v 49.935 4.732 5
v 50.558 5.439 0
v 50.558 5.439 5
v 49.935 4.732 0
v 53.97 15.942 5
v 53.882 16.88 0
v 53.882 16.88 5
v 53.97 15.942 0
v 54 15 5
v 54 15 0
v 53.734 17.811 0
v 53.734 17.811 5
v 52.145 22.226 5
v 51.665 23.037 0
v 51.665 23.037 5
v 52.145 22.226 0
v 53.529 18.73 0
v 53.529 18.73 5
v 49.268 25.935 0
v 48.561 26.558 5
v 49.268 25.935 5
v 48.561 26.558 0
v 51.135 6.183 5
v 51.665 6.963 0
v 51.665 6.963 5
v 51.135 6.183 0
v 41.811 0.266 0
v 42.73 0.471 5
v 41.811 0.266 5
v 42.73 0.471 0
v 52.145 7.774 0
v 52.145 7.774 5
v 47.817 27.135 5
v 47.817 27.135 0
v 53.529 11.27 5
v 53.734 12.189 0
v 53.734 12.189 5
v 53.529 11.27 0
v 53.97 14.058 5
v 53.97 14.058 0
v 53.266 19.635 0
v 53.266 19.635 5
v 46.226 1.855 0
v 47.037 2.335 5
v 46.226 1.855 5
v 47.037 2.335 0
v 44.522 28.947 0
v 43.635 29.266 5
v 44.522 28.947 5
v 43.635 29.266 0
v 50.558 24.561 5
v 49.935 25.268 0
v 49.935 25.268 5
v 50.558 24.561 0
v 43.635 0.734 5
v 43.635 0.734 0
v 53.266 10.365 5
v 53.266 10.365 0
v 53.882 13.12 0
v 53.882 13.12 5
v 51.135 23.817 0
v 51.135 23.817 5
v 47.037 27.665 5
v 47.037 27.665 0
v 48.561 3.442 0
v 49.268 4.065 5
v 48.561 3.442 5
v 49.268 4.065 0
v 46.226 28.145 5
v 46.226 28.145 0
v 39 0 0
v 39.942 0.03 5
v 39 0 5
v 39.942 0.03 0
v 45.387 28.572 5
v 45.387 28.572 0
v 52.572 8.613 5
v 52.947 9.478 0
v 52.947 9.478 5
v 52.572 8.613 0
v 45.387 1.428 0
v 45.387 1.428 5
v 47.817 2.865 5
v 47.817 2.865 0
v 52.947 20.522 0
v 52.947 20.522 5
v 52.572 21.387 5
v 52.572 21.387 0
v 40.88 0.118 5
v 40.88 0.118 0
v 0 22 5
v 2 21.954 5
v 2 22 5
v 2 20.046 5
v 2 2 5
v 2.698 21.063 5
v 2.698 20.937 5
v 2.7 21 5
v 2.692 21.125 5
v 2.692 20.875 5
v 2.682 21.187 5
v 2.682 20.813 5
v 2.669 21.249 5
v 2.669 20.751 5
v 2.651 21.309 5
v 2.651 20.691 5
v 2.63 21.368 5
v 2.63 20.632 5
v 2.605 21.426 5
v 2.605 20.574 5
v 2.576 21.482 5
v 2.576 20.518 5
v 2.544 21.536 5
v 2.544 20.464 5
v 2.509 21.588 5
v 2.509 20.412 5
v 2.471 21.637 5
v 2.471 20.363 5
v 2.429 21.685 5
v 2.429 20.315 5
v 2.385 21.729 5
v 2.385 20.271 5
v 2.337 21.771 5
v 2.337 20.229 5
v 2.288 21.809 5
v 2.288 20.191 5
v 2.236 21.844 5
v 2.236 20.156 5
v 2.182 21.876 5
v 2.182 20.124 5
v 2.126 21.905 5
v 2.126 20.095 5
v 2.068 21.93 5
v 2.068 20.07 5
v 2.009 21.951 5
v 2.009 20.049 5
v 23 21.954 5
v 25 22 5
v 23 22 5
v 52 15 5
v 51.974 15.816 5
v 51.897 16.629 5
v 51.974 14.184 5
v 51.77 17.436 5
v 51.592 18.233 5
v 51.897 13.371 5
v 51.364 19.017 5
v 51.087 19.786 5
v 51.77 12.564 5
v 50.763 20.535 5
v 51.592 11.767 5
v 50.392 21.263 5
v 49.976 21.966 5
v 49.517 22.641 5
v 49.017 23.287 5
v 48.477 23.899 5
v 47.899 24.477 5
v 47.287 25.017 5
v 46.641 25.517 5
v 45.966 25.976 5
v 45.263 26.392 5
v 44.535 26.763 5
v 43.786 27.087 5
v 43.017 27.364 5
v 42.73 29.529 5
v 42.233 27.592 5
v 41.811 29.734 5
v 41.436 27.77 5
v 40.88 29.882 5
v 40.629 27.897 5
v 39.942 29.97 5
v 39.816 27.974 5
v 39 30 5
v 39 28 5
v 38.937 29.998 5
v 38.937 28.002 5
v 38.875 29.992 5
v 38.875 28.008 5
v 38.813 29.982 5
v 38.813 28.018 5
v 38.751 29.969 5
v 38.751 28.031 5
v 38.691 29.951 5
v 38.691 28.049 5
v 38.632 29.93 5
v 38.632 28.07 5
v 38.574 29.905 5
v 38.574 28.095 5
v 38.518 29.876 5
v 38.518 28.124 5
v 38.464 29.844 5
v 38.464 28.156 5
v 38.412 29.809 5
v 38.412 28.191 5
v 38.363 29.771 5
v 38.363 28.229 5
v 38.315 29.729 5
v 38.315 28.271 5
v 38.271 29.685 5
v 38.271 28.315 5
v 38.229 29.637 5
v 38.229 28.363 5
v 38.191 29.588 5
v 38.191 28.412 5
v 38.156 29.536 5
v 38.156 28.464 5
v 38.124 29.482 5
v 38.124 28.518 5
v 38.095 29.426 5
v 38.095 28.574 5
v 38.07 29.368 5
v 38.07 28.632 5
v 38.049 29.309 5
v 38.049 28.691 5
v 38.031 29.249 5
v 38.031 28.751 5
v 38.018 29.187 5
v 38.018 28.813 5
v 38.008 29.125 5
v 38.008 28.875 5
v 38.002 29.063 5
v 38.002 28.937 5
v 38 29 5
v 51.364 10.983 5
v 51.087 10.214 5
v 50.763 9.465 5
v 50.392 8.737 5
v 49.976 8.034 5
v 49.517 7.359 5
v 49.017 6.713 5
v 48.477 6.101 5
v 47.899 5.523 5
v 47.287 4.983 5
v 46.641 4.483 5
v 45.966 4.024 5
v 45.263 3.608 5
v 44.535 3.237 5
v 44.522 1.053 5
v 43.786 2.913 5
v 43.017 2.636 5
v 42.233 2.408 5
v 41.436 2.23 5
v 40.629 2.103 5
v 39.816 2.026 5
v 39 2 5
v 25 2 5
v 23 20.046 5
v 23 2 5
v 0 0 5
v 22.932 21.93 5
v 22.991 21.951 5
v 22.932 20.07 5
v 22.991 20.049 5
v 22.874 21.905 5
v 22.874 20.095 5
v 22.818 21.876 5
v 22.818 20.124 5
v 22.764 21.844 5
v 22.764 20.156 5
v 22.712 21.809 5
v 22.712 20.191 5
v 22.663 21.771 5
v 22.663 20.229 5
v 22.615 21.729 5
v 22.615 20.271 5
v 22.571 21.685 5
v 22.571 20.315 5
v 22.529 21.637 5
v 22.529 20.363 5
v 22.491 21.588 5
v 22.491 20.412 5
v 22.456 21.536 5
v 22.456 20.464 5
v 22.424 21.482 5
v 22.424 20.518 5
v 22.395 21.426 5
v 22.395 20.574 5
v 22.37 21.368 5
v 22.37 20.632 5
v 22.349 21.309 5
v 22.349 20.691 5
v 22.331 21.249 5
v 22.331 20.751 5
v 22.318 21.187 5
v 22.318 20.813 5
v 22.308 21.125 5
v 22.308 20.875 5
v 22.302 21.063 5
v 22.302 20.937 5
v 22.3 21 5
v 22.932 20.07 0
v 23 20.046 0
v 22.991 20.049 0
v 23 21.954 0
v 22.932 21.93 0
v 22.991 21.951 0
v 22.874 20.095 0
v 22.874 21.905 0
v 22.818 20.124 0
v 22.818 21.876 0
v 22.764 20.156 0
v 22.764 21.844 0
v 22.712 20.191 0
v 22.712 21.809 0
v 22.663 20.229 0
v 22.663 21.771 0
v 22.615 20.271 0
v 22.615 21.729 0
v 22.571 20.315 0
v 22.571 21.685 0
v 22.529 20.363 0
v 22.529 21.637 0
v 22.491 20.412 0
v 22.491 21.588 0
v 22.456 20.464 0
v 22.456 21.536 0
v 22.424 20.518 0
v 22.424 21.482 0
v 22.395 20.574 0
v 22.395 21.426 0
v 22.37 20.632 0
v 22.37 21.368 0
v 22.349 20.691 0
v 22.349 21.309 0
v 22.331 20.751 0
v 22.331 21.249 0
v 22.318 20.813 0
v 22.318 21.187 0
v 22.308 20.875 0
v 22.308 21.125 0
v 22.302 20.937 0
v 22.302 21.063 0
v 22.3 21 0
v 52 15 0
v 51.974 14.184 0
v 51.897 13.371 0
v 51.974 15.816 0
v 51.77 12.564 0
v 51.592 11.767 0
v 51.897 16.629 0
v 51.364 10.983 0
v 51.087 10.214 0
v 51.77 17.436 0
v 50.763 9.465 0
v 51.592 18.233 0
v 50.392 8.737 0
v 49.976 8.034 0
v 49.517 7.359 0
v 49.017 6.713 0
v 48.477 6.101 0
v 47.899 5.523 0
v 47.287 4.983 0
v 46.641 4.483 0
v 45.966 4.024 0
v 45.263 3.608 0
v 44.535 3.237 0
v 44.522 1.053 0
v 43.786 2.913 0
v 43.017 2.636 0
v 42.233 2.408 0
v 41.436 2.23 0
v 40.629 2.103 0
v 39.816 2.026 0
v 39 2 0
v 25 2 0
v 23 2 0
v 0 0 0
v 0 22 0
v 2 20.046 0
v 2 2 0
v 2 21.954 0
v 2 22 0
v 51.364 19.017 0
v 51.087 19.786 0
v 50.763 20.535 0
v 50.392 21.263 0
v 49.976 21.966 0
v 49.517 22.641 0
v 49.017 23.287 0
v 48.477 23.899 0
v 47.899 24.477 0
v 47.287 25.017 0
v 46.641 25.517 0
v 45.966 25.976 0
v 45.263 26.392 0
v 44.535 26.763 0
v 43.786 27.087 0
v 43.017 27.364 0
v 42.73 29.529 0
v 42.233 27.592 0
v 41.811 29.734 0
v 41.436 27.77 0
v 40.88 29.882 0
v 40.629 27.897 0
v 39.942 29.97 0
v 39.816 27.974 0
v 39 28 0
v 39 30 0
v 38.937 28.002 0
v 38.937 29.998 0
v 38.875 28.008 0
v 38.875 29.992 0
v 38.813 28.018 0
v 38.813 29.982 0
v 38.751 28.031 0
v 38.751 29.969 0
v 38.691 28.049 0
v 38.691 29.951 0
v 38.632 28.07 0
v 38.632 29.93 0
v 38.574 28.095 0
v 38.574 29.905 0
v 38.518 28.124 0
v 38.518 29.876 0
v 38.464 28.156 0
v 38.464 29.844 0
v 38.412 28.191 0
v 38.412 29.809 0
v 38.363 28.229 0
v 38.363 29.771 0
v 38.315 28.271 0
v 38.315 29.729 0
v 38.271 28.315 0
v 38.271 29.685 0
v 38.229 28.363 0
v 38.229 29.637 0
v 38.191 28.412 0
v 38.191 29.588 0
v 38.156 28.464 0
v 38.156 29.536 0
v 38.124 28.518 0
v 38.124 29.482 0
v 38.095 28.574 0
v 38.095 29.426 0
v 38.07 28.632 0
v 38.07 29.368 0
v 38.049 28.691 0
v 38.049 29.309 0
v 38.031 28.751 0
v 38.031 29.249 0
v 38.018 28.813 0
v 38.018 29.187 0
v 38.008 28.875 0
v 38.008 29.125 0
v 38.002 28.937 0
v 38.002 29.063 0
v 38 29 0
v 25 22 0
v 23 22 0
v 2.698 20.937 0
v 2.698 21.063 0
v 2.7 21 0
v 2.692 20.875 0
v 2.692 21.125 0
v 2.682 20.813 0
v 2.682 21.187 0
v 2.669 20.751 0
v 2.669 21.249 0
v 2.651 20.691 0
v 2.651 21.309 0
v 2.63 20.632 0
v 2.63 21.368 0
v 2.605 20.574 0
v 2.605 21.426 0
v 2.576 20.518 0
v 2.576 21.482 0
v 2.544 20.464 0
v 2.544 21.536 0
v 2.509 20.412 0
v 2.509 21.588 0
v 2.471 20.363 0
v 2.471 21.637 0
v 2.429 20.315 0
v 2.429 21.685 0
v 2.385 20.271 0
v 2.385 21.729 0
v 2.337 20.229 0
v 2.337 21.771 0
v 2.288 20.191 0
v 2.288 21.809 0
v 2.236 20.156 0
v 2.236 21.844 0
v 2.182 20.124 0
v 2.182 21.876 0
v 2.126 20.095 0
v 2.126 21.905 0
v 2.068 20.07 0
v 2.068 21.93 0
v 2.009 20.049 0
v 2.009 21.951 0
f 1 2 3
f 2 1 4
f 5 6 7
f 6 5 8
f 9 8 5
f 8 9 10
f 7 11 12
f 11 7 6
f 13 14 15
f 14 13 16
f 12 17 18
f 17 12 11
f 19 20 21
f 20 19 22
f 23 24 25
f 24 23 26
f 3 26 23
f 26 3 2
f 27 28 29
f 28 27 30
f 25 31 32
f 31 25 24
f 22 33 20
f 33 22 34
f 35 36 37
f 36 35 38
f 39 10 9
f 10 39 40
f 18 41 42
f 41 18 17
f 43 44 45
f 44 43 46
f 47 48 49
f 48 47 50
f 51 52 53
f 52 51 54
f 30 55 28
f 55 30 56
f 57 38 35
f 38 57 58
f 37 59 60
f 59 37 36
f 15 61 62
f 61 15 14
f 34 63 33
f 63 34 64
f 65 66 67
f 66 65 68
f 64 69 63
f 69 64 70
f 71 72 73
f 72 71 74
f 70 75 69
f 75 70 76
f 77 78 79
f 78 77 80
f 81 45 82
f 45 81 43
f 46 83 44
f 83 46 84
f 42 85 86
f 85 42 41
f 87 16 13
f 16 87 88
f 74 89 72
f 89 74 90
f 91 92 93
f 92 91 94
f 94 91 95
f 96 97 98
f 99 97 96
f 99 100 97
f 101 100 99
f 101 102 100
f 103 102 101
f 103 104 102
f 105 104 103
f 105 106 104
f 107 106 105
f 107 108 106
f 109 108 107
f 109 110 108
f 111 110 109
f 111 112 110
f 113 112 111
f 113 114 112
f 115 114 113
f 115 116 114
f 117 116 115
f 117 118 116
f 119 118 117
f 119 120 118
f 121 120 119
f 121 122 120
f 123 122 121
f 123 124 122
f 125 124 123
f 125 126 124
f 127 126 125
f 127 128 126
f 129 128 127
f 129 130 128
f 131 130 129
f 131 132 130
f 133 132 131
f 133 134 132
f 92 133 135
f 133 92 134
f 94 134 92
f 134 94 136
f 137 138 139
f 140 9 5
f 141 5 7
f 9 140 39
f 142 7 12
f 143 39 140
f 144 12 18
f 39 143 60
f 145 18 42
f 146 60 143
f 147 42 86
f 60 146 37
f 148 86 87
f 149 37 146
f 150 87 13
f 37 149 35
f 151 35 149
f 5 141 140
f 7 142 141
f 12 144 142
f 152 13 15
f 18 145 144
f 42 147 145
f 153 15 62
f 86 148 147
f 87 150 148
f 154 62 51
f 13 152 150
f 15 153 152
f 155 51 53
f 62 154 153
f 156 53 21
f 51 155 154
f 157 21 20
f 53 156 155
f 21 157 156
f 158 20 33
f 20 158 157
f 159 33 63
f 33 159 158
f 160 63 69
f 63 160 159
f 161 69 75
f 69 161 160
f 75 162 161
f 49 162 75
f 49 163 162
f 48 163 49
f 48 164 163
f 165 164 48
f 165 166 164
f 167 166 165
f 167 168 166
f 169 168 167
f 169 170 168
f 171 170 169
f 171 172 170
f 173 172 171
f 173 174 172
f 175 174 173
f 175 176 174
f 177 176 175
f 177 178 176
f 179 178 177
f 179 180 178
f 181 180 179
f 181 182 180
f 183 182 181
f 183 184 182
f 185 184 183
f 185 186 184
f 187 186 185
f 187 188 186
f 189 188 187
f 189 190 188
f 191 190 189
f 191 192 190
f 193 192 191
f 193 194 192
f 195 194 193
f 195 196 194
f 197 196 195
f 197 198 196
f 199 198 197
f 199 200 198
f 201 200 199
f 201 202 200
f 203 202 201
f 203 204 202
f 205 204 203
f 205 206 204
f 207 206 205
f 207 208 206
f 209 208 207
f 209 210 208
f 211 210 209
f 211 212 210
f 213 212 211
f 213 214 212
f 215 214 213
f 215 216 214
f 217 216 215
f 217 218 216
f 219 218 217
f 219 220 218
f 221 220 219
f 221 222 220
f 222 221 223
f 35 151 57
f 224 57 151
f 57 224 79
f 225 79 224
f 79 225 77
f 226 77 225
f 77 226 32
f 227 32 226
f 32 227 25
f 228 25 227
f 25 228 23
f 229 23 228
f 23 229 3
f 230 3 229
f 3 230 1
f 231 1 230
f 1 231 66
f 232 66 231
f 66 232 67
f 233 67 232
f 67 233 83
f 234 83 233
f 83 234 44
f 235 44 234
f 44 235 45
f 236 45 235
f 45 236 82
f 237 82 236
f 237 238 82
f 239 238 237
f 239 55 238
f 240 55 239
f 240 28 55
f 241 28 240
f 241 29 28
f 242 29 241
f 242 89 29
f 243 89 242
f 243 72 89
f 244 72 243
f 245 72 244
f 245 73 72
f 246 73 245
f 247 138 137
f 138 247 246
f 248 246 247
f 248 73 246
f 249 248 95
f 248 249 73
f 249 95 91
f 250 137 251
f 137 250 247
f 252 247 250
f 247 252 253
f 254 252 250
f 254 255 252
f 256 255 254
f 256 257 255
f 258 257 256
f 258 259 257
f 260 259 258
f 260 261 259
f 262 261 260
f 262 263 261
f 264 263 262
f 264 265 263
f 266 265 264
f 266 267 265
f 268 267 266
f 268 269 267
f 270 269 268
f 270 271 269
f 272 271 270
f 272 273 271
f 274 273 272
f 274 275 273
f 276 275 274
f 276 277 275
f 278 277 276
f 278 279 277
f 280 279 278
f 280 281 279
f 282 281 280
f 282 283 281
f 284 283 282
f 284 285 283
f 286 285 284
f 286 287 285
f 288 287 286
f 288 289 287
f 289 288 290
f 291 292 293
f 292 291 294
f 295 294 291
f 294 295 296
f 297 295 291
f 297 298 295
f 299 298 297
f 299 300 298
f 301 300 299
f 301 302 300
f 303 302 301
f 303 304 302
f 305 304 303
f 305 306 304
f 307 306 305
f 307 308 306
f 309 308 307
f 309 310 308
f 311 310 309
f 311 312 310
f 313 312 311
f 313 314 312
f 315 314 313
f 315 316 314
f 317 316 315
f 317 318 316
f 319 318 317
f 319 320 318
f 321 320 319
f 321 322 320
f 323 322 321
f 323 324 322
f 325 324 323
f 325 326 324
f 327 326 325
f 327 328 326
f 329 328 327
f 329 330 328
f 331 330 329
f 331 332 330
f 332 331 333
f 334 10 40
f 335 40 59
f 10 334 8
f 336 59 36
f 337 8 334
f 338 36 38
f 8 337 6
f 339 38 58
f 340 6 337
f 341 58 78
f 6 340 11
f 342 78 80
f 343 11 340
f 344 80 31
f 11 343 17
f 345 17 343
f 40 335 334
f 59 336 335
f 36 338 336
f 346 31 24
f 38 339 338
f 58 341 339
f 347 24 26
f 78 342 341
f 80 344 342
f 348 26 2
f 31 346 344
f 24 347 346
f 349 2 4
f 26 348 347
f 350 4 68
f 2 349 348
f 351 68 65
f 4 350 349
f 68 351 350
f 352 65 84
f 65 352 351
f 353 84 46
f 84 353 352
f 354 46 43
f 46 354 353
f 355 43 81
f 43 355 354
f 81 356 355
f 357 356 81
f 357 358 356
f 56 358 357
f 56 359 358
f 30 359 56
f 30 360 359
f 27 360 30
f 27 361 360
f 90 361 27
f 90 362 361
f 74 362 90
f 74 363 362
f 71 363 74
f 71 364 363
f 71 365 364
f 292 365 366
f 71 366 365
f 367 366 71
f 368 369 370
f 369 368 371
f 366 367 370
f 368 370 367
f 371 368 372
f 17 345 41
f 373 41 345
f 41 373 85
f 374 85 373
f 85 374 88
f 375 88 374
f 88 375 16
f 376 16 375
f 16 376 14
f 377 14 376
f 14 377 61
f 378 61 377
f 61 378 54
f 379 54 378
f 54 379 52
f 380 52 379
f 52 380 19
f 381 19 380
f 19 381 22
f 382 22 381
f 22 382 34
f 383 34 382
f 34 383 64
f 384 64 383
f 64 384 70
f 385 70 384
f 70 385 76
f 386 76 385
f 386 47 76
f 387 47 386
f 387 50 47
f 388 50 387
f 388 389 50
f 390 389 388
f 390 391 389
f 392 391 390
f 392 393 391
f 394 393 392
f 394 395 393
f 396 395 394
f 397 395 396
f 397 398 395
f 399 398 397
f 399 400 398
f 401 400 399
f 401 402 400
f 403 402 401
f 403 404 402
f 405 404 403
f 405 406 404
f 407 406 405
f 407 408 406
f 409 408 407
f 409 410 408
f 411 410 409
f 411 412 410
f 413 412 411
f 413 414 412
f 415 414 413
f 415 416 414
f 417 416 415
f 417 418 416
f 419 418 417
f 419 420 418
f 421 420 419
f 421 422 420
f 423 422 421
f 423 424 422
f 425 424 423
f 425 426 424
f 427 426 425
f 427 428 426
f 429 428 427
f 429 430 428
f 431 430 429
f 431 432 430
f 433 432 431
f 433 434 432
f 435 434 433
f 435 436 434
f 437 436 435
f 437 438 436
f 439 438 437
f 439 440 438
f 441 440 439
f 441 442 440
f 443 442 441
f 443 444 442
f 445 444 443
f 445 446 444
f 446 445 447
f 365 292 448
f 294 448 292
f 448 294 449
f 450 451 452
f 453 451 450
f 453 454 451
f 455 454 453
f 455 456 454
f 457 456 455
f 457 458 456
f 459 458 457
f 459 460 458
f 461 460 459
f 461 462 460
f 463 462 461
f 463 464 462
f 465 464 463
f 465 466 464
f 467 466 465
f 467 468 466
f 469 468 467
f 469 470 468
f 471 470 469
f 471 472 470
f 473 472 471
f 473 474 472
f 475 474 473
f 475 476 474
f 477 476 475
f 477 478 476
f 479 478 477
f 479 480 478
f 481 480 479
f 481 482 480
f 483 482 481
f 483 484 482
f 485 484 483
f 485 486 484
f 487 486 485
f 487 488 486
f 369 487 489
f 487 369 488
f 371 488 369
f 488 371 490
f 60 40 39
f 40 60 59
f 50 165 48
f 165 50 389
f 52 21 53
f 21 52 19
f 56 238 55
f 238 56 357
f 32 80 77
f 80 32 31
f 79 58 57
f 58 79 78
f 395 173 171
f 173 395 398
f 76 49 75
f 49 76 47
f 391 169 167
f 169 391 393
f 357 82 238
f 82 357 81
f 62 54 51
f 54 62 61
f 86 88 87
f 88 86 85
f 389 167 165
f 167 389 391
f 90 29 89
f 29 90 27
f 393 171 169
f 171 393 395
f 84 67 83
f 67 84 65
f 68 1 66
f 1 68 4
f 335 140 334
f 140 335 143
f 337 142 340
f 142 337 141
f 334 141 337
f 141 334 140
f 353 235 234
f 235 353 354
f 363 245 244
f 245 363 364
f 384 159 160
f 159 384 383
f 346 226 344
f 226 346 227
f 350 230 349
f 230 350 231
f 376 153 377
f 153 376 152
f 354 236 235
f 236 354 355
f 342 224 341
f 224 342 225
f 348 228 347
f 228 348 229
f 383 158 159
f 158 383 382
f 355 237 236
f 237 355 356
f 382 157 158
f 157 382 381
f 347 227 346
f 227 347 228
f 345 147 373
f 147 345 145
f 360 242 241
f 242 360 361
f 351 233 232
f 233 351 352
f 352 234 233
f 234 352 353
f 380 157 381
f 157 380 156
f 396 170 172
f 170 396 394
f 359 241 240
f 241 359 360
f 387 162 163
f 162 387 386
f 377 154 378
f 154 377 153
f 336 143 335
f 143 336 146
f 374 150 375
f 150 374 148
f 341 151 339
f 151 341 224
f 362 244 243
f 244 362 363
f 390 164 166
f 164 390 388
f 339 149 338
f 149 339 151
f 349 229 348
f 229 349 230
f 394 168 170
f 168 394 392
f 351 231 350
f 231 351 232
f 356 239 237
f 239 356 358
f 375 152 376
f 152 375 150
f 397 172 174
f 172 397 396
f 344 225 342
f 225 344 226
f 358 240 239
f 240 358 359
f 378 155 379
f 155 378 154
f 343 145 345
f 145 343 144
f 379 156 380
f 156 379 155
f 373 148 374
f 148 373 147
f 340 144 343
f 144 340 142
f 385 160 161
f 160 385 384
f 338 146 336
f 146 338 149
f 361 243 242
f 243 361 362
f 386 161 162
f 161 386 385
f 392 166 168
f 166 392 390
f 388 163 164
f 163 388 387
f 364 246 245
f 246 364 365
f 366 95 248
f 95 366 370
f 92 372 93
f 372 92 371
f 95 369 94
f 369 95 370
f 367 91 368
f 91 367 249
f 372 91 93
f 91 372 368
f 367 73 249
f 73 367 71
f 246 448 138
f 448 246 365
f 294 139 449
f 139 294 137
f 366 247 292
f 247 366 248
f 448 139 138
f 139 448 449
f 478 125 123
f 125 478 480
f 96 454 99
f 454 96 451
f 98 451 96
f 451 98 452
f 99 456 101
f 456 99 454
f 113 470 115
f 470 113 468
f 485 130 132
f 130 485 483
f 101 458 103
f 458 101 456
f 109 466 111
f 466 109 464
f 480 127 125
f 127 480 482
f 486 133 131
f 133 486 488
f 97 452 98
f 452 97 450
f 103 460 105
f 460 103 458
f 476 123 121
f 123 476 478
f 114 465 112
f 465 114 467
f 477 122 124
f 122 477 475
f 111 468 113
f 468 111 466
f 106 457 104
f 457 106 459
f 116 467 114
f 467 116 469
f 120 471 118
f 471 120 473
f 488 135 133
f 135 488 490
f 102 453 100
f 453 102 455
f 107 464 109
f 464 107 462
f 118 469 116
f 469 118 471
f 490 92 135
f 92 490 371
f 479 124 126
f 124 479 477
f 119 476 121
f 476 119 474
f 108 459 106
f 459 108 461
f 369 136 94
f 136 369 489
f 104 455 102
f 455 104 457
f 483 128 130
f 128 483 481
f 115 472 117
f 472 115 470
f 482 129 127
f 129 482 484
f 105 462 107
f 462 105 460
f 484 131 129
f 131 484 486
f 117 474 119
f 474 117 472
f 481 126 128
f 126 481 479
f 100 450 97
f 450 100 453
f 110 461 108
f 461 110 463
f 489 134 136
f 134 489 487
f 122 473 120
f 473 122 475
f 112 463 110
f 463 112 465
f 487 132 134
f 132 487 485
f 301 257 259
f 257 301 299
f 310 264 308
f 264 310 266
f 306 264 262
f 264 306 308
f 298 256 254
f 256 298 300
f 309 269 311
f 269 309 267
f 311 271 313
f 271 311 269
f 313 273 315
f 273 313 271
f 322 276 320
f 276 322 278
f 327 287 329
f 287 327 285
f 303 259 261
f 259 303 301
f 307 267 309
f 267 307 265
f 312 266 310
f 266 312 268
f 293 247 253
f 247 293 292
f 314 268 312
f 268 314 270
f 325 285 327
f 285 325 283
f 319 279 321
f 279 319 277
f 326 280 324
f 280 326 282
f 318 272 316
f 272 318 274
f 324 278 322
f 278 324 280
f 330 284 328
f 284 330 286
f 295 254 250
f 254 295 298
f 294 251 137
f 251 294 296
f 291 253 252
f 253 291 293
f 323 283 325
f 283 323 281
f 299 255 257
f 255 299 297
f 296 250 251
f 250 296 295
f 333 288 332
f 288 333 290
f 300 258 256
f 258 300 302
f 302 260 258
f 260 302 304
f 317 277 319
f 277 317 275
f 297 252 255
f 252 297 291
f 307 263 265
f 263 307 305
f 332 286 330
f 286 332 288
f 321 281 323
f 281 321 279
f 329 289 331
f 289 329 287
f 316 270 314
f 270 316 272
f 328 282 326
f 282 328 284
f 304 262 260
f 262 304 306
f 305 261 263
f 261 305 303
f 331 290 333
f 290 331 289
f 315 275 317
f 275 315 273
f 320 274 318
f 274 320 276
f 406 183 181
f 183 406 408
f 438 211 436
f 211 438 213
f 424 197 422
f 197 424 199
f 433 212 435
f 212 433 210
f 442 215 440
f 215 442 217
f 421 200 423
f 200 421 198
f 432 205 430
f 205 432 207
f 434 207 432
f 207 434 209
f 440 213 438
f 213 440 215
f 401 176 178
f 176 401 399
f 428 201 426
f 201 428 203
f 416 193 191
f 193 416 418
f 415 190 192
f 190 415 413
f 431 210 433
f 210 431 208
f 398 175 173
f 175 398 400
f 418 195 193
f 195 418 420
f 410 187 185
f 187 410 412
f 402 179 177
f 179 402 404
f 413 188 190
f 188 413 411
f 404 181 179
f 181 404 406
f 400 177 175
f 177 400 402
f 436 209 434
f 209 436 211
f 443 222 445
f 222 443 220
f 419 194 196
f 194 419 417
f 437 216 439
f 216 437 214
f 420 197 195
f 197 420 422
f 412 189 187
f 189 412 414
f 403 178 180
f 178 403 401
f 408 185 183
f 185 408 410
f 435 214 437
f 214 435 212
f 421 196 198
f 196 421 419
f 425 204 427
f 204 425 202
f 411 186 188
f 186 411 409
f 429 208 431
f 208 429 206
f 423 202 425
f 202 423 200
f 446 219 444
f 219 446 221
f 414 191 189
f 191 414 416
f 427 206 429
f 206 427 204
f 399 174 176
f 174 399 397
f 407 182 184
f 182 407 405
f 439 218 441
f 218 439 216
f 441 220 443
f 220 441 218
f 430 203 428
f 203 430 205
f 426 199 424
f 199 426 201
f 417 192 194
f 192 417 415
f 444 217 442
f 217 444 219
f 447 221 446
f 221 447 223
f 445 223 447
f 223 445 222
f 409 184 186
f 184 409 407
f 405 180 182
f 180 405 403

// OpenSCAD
//CUSTOMIZER VARIABLES
/* [Basic] */
//Table thickness (in mm)
Table_Thickness=20;//[5:100]
//Length (in mm)
Length=20;//[5:50]
//Clip thickness (in mm)
Clip_Thickness=2;//[1:6]
//Clip width (in mm)
Clip_Width=5;//[5:30]
//Max cable diameter (in mm)
Cable_Diameter=26;//[3:50]
// Smoothness
$fn = 100; //[30:100]


cube ([Clip_Thickness, Length + Clip_Thickness, Clip_Width]);

translate ([Table_Thickness+ Clip_Thickness + 1, 0, 0])
	cube ([Clip_Thickness, Length + Clip_Thickness, Clip_Width]);

cube ([Table_Thickness+ (Clip_Thickness * 3) + (Cable_Diameter / 2), Clip_Thickness, Clip_Width]);

translate ([Clip_Thickness - 0.3, (Length - 1) + Clip_Thickness, 0])
	cylinder(h = Clip_Width, r = 1);

translate ([Table_Thickness+ Clip_Thickness + 1.3, (Length - 1) + Clip_Thickness, 0])
	cylinder(h = Clip_Width, r = 1);

translate ([Table_Thickness+ (Clip_Thickness * 3) + (Cable_Diameter / 2), Cable_Diameter + (Clip_Thickness * 1.5), 0])
	cylinder(h = Clip_Width, r = (Clip_Thickness / 2));

translate ([Table_Thickness+ (Clip_Thickness * 3) + (Cable_Diameter / 2), (Cable_Diameter / 2) + Clip_Thickness, 0])
	difference ()
	{
		cylinder(h = Clip_Width, r = (Cable_Diameter / 2) + Clip_Thickness);

		translate ([0, 0, -0.5])
			cylinder(h = Clip_Width + 1, r = (Cable_Diameter / 2));

		translate ([((-Cable_Diameter) / 2) - Clip_Thickness, ((-Cable_Diameter) / 2), (-0.5)])
			cube([(Cable_Diameter / 2) + Clip_Thickness, Cable_Diameter + Clip_Thickness, Clip_Width + 1]);
	}
